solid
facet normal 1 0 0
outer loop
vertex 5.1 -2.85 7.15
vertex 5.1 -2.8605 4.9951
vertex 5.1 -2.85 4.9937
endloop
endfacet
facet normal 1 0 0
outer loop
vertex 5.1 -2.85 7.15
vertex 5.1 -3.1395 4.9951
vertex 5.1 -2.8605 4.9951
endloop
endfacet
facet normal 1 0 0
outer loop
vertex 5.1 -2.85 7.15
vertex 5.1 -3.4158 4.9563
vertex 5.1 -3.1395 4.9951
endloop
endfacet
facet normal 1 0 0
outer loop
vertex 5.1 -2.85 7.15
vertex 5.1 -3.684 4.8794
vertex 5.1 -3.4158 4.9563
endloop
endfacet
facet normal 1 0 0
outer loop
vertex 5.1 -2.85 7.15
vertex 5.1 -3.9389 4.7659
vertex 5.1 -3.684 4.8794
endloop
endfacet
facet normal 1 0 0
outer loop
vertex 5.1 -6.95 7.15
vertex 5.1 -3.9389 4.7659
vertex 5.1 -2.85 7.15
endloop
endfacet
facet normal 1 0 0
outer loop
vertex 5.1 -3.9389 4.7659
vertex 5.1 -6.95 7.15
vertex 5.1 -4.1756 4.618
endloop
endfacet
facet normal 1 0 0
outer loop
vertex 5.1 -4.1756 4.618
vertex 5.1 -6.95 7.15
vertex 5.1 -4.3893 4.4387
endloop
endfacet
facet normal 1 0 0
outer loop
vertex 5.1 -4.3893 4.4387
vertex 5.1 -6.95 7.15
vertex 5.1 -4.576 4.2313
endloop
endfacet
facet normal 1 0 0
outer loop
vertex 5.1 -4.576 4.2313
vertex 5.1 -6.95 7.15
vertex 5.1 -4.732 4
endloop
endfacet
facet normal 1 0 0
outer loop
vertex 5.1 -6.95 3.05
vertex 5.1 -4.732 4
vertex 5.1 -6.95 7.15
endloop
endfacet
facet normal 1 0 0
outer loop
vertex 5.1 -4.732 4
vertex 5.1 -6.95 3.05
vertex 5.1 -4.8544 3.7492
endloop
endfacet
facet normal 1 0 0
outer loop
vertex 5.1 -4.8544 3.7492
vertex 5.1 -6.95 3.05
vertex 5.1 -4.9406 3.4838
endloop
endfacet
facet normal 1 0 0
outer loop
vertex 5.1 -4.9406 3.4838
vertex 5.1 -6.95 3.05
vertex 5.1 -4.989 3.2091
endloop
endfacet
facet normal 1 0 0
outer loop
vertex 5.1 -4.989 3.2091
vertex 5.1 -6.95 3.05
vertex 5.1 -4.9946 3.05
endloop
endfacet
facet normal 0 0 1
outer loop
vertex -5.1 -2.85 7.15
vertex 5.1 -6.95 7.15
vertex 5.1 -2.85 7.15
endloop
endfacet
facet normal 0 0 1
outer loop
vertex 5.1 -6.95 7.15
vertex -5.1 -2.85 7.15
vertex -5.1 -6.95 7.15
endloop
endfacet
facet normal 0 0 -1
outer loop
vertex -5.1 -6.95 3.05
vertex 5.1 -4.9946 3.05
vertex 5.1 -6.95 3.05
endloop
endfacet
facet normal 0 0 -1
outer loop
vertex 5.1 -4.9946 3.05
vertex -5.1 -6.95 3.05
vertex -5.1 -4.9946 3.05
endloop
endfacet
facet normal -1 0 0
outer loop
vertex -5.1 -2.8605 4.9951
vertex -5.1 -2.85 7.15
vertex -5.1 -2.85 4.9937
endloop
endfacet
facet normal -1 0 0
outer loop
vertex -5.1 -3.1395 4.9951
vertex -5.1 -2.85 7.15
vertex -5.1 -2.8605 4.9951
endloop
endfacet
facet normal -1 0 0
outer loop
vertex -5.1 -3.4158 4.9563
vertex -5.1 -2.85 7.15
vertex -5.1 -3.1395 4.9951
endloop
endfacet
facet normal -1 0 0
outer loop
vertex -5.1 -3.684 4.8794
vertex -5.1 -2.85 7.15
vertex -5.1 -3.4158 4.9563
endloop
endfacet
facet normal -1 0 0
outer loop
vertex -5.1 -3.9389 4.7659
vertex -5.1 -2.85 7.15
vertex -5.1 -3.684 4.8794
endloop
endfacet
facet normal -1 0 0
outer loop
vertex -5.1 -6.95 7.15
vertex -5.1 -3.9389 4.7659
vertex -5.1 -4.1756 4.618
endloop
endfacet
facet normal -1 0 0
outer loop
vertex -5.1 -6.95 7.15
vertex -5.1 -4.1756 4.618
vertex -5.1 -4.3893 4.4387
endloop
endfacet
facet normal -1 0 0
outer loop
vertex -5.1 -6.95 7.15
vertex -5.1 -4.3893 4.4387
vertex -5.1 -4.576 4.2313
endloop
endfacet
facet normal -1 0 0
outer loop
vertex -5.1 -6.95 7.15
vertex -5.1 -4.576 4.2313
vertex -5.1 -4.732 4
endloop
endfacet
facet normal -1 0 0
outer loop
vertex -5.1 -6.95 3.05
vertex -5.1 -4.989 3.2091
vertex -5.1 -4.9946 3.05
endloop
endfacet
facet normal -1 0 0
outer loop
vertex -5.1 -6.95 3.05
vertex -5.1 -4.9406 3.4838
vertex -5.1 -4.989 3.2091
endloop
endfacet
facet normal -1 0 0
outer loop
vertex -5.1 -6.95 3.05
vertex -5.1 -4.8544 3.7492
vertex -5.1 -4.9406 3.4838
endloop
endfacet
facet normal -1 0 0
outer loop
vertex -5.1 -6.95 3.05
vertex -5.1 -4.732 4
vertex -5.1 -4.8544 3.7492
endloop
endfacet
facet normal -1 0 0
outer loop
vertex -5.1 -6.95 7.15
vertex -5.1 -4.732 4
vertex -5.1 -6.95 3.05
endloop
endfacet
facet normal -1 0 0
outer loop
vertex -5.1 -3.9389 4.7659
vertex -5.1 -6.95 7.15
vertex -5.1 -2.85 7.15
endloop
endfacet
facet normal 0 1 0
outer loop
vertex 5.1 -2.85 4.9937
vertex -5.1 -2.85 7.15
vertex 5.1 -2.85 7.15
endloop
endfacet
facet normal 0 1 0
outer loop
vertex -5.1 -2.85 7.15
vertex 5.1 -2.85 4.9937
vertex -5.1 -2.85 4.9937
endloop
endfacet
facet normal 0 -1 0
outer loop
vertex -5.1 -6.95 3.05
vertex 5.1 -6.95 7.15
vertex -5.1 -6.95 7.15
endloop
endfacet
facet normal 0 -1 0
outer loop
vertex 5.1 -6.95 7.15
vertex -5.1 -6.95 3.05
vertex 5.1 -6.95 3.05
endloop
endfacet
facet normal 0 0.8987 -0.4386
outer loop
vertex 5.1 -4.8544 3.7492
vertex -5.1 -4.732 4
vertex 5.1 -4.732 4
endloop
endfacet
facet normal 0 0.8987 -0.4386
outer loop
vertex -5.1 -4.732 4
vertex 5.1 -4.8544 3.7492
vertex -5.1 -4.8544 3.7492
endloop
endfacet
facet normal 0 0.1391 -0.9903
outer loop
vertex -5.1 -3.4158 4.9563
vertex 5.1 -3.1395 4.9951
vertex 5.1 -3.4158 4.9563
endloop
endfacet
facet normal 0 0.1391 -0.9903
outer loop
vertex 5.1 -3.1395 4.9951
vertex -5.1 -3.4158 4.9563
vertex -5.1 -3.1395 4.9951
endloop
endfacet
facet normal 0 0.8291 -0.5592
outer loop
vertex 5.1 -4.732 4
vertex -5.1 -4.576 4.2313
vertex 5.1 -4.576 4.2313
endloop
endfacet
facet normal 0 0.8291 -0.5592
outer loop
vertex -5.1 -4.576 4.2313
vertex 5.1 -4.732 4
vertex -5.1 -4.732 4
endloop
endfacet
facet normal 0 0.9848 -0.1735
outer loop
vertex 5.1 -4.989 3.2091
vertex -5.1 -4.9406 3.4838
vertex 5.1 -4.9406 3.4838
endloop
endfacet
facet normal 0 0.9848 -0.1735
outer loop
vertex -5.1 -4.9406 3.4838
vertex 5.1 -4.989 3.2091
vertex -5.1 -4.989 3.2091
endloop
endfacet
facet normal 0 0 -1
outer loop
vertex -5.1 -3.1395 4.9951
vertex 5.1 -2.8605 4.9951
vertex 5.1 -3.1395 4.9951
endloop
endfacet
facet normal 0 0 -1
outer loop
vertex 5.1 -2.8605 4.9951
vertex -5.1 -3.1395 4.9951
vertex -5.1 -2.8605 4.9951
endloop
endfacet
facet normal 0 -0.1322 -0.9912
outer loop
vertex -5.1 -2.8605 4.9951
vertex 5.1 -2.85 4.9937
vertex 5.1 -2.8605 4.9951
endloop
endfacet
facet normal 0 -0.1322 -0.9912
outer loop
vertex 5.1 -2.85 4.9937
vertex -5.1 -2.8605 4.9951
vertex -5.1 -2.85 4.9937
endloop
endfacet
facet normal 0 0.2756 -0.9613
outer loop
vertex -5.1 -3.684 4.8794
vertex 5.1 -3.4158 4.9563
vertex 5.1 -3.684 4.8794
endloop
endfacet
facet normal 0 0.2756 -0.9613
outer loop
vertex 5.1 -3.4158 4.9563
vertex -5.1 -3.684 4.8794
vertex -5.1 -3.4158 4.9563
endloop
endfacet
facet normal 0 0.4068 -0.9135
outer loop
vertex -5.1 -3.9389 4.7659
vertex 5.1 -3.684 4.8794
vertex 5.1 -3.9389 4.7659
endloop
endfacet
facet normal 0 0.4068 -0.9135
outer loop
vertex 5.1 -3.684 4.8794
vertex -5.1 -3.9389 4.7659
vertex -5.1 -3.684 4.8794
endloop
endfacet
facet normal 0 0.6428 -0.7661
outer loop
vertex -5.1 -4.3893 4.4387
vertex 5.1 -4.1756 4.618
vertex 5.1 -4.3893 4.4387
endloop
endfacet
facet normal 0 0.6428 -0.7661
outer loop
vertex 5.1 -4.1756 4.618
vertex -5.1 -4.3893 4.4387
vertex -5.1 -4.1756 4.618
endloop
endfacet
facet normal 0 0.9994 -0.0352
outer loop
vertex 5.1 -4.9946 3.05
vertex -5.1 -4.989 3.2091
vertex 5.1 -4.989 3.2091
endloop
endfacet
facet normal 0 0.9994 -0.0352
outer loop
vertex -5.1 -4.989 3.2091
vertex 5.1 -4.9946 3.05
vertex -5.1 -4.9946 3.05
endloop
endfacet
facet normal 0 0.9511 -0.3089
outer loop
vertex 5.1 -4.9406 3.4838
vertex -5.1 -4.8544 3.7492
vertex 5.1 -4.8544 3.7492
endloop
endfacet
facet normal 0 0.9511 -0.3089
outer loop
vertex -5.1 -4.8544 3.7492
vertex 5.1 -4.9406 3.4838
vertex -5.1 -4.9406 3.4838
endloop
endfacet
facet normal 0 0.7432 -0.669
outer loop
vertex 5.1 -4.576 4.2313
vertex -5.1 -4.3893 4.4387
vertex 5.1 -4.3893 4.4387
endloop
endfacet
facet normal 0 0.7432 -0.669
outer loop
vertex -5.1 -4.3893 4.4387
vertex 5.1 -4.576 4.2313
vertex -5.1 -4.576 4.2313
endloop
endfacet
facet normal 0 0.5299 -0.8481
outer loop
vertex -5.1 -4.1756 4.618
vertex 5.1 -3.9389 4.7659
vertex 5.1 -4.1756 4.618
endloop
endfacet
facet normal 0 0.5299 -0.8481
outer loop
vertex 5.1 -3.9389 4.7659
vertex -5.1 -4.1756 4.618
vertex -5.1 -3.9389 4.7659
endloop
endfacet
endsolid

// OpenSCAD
pad = 0.1;	// Padding to maintain manifold
box_l = 10;	// Length
box_w = 10;	// Width
box_h = 10;	// Height
round_r = 2;	// Radius of round
smooth = 45;	// Number of facets of rounding cylinder

// So we cut off the part that is not cylinder shaped
translate([0, -box_w/2+round_r, box_h/2-round_r]) {
	difference() {
		translate([0,-round_r+pad,round_r+pad])
			cube([box_l+2*pad, round_r*2+pad, round_r*2+pad], center = true);
		rotate(a=[0,90,0])
			cylinder(box_l+4*pad,round_r,round_r,center=true,$fn=smooth);
	}
}
